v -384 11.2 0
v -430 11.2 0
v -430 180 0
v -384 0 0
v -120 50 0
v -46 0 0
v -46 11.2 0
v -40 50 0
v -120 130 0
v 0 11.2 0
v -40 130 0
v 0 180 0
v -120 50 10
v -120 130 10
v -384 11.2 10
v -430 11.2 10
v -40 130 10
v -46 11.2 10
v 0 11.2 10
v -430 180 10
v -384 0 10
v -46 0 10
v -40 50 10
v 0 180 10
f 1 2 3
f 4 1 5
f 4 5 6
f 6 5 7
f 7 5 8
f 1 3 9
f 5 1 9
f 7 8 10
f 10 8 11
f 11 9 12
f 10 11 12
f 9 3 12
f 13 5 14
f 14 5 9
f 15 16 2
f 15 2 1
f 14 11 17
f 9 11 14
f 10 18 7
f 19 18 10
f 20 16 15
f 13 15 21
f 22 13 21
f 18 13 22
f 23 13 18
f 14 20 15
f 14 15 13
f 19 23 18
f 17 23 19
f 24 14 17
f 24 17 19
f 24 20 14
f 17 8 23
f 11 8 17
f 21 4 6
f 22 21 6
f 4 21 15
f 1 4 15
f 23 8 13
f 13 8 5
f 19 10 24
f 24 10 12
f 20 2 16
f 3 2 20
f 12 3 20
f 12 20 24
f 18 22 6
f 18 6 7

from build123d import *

# Parameters (mm, degrees)
ESQUISSE1_W             = 430
ESQUISSE1_H             = 180
BOSS_EXTRU_1_DEPTH      = 10
ESQUISSE2_W             = 80
ESQUISSE2_H             = 80
ENL_V_MAT_EXTRU_1_DEPTH = 10
ESQUISSE4_W             = 46
ESQUISSE4_H             = 11.2
ENL_V_MAT_EXTRU_2_DEPTH = 10


with BuildPart() as part:
    # Esquisse1 → Boss.-Extru.1 (new body)
    with BuildSketch(Plane.XY):
        with Locations((-215, 90)):
            Rectangle(ESQUISSE1_W, ESQUISSE1_H)
    extrude(amount=BOSS_EXTRU_1_DEPTH)

    # Esquisse2 → Enlèv. mat.-Extru.1 (cut)
    with BuildSketch(Plane(origin=(0, 0, 0), x_dir=(-1, 0, 0), z_dir=(0, 0, -1))):
        with Locations((80, 90)):
            Rectangle(ESQUISSE2_W, ESQUISSE2_H)
    extrude(amount=-ENL_V_MAT_EXTRU_1_DEPTH, mode=Mode.SUBTRACT)

    # Esquisse4 → Enlèv. mat.-Extru.2 (cut)
    with BuildSketch(Plane.XY.offset(10)):
        with Locations((-23, 5.6)):
            Rectangle(ESQUISSE4_W, ESQUISSE4_H)
        with Locations((-407, 5.6)):
            Rectangle(ESQUISSE4_W, ESQUISSE4_H)
    extrude(amount=-ENL_V_MAT_EXTRU_2_DEPTH, mode=Mode.SUBTRACT)


solid = part.part
